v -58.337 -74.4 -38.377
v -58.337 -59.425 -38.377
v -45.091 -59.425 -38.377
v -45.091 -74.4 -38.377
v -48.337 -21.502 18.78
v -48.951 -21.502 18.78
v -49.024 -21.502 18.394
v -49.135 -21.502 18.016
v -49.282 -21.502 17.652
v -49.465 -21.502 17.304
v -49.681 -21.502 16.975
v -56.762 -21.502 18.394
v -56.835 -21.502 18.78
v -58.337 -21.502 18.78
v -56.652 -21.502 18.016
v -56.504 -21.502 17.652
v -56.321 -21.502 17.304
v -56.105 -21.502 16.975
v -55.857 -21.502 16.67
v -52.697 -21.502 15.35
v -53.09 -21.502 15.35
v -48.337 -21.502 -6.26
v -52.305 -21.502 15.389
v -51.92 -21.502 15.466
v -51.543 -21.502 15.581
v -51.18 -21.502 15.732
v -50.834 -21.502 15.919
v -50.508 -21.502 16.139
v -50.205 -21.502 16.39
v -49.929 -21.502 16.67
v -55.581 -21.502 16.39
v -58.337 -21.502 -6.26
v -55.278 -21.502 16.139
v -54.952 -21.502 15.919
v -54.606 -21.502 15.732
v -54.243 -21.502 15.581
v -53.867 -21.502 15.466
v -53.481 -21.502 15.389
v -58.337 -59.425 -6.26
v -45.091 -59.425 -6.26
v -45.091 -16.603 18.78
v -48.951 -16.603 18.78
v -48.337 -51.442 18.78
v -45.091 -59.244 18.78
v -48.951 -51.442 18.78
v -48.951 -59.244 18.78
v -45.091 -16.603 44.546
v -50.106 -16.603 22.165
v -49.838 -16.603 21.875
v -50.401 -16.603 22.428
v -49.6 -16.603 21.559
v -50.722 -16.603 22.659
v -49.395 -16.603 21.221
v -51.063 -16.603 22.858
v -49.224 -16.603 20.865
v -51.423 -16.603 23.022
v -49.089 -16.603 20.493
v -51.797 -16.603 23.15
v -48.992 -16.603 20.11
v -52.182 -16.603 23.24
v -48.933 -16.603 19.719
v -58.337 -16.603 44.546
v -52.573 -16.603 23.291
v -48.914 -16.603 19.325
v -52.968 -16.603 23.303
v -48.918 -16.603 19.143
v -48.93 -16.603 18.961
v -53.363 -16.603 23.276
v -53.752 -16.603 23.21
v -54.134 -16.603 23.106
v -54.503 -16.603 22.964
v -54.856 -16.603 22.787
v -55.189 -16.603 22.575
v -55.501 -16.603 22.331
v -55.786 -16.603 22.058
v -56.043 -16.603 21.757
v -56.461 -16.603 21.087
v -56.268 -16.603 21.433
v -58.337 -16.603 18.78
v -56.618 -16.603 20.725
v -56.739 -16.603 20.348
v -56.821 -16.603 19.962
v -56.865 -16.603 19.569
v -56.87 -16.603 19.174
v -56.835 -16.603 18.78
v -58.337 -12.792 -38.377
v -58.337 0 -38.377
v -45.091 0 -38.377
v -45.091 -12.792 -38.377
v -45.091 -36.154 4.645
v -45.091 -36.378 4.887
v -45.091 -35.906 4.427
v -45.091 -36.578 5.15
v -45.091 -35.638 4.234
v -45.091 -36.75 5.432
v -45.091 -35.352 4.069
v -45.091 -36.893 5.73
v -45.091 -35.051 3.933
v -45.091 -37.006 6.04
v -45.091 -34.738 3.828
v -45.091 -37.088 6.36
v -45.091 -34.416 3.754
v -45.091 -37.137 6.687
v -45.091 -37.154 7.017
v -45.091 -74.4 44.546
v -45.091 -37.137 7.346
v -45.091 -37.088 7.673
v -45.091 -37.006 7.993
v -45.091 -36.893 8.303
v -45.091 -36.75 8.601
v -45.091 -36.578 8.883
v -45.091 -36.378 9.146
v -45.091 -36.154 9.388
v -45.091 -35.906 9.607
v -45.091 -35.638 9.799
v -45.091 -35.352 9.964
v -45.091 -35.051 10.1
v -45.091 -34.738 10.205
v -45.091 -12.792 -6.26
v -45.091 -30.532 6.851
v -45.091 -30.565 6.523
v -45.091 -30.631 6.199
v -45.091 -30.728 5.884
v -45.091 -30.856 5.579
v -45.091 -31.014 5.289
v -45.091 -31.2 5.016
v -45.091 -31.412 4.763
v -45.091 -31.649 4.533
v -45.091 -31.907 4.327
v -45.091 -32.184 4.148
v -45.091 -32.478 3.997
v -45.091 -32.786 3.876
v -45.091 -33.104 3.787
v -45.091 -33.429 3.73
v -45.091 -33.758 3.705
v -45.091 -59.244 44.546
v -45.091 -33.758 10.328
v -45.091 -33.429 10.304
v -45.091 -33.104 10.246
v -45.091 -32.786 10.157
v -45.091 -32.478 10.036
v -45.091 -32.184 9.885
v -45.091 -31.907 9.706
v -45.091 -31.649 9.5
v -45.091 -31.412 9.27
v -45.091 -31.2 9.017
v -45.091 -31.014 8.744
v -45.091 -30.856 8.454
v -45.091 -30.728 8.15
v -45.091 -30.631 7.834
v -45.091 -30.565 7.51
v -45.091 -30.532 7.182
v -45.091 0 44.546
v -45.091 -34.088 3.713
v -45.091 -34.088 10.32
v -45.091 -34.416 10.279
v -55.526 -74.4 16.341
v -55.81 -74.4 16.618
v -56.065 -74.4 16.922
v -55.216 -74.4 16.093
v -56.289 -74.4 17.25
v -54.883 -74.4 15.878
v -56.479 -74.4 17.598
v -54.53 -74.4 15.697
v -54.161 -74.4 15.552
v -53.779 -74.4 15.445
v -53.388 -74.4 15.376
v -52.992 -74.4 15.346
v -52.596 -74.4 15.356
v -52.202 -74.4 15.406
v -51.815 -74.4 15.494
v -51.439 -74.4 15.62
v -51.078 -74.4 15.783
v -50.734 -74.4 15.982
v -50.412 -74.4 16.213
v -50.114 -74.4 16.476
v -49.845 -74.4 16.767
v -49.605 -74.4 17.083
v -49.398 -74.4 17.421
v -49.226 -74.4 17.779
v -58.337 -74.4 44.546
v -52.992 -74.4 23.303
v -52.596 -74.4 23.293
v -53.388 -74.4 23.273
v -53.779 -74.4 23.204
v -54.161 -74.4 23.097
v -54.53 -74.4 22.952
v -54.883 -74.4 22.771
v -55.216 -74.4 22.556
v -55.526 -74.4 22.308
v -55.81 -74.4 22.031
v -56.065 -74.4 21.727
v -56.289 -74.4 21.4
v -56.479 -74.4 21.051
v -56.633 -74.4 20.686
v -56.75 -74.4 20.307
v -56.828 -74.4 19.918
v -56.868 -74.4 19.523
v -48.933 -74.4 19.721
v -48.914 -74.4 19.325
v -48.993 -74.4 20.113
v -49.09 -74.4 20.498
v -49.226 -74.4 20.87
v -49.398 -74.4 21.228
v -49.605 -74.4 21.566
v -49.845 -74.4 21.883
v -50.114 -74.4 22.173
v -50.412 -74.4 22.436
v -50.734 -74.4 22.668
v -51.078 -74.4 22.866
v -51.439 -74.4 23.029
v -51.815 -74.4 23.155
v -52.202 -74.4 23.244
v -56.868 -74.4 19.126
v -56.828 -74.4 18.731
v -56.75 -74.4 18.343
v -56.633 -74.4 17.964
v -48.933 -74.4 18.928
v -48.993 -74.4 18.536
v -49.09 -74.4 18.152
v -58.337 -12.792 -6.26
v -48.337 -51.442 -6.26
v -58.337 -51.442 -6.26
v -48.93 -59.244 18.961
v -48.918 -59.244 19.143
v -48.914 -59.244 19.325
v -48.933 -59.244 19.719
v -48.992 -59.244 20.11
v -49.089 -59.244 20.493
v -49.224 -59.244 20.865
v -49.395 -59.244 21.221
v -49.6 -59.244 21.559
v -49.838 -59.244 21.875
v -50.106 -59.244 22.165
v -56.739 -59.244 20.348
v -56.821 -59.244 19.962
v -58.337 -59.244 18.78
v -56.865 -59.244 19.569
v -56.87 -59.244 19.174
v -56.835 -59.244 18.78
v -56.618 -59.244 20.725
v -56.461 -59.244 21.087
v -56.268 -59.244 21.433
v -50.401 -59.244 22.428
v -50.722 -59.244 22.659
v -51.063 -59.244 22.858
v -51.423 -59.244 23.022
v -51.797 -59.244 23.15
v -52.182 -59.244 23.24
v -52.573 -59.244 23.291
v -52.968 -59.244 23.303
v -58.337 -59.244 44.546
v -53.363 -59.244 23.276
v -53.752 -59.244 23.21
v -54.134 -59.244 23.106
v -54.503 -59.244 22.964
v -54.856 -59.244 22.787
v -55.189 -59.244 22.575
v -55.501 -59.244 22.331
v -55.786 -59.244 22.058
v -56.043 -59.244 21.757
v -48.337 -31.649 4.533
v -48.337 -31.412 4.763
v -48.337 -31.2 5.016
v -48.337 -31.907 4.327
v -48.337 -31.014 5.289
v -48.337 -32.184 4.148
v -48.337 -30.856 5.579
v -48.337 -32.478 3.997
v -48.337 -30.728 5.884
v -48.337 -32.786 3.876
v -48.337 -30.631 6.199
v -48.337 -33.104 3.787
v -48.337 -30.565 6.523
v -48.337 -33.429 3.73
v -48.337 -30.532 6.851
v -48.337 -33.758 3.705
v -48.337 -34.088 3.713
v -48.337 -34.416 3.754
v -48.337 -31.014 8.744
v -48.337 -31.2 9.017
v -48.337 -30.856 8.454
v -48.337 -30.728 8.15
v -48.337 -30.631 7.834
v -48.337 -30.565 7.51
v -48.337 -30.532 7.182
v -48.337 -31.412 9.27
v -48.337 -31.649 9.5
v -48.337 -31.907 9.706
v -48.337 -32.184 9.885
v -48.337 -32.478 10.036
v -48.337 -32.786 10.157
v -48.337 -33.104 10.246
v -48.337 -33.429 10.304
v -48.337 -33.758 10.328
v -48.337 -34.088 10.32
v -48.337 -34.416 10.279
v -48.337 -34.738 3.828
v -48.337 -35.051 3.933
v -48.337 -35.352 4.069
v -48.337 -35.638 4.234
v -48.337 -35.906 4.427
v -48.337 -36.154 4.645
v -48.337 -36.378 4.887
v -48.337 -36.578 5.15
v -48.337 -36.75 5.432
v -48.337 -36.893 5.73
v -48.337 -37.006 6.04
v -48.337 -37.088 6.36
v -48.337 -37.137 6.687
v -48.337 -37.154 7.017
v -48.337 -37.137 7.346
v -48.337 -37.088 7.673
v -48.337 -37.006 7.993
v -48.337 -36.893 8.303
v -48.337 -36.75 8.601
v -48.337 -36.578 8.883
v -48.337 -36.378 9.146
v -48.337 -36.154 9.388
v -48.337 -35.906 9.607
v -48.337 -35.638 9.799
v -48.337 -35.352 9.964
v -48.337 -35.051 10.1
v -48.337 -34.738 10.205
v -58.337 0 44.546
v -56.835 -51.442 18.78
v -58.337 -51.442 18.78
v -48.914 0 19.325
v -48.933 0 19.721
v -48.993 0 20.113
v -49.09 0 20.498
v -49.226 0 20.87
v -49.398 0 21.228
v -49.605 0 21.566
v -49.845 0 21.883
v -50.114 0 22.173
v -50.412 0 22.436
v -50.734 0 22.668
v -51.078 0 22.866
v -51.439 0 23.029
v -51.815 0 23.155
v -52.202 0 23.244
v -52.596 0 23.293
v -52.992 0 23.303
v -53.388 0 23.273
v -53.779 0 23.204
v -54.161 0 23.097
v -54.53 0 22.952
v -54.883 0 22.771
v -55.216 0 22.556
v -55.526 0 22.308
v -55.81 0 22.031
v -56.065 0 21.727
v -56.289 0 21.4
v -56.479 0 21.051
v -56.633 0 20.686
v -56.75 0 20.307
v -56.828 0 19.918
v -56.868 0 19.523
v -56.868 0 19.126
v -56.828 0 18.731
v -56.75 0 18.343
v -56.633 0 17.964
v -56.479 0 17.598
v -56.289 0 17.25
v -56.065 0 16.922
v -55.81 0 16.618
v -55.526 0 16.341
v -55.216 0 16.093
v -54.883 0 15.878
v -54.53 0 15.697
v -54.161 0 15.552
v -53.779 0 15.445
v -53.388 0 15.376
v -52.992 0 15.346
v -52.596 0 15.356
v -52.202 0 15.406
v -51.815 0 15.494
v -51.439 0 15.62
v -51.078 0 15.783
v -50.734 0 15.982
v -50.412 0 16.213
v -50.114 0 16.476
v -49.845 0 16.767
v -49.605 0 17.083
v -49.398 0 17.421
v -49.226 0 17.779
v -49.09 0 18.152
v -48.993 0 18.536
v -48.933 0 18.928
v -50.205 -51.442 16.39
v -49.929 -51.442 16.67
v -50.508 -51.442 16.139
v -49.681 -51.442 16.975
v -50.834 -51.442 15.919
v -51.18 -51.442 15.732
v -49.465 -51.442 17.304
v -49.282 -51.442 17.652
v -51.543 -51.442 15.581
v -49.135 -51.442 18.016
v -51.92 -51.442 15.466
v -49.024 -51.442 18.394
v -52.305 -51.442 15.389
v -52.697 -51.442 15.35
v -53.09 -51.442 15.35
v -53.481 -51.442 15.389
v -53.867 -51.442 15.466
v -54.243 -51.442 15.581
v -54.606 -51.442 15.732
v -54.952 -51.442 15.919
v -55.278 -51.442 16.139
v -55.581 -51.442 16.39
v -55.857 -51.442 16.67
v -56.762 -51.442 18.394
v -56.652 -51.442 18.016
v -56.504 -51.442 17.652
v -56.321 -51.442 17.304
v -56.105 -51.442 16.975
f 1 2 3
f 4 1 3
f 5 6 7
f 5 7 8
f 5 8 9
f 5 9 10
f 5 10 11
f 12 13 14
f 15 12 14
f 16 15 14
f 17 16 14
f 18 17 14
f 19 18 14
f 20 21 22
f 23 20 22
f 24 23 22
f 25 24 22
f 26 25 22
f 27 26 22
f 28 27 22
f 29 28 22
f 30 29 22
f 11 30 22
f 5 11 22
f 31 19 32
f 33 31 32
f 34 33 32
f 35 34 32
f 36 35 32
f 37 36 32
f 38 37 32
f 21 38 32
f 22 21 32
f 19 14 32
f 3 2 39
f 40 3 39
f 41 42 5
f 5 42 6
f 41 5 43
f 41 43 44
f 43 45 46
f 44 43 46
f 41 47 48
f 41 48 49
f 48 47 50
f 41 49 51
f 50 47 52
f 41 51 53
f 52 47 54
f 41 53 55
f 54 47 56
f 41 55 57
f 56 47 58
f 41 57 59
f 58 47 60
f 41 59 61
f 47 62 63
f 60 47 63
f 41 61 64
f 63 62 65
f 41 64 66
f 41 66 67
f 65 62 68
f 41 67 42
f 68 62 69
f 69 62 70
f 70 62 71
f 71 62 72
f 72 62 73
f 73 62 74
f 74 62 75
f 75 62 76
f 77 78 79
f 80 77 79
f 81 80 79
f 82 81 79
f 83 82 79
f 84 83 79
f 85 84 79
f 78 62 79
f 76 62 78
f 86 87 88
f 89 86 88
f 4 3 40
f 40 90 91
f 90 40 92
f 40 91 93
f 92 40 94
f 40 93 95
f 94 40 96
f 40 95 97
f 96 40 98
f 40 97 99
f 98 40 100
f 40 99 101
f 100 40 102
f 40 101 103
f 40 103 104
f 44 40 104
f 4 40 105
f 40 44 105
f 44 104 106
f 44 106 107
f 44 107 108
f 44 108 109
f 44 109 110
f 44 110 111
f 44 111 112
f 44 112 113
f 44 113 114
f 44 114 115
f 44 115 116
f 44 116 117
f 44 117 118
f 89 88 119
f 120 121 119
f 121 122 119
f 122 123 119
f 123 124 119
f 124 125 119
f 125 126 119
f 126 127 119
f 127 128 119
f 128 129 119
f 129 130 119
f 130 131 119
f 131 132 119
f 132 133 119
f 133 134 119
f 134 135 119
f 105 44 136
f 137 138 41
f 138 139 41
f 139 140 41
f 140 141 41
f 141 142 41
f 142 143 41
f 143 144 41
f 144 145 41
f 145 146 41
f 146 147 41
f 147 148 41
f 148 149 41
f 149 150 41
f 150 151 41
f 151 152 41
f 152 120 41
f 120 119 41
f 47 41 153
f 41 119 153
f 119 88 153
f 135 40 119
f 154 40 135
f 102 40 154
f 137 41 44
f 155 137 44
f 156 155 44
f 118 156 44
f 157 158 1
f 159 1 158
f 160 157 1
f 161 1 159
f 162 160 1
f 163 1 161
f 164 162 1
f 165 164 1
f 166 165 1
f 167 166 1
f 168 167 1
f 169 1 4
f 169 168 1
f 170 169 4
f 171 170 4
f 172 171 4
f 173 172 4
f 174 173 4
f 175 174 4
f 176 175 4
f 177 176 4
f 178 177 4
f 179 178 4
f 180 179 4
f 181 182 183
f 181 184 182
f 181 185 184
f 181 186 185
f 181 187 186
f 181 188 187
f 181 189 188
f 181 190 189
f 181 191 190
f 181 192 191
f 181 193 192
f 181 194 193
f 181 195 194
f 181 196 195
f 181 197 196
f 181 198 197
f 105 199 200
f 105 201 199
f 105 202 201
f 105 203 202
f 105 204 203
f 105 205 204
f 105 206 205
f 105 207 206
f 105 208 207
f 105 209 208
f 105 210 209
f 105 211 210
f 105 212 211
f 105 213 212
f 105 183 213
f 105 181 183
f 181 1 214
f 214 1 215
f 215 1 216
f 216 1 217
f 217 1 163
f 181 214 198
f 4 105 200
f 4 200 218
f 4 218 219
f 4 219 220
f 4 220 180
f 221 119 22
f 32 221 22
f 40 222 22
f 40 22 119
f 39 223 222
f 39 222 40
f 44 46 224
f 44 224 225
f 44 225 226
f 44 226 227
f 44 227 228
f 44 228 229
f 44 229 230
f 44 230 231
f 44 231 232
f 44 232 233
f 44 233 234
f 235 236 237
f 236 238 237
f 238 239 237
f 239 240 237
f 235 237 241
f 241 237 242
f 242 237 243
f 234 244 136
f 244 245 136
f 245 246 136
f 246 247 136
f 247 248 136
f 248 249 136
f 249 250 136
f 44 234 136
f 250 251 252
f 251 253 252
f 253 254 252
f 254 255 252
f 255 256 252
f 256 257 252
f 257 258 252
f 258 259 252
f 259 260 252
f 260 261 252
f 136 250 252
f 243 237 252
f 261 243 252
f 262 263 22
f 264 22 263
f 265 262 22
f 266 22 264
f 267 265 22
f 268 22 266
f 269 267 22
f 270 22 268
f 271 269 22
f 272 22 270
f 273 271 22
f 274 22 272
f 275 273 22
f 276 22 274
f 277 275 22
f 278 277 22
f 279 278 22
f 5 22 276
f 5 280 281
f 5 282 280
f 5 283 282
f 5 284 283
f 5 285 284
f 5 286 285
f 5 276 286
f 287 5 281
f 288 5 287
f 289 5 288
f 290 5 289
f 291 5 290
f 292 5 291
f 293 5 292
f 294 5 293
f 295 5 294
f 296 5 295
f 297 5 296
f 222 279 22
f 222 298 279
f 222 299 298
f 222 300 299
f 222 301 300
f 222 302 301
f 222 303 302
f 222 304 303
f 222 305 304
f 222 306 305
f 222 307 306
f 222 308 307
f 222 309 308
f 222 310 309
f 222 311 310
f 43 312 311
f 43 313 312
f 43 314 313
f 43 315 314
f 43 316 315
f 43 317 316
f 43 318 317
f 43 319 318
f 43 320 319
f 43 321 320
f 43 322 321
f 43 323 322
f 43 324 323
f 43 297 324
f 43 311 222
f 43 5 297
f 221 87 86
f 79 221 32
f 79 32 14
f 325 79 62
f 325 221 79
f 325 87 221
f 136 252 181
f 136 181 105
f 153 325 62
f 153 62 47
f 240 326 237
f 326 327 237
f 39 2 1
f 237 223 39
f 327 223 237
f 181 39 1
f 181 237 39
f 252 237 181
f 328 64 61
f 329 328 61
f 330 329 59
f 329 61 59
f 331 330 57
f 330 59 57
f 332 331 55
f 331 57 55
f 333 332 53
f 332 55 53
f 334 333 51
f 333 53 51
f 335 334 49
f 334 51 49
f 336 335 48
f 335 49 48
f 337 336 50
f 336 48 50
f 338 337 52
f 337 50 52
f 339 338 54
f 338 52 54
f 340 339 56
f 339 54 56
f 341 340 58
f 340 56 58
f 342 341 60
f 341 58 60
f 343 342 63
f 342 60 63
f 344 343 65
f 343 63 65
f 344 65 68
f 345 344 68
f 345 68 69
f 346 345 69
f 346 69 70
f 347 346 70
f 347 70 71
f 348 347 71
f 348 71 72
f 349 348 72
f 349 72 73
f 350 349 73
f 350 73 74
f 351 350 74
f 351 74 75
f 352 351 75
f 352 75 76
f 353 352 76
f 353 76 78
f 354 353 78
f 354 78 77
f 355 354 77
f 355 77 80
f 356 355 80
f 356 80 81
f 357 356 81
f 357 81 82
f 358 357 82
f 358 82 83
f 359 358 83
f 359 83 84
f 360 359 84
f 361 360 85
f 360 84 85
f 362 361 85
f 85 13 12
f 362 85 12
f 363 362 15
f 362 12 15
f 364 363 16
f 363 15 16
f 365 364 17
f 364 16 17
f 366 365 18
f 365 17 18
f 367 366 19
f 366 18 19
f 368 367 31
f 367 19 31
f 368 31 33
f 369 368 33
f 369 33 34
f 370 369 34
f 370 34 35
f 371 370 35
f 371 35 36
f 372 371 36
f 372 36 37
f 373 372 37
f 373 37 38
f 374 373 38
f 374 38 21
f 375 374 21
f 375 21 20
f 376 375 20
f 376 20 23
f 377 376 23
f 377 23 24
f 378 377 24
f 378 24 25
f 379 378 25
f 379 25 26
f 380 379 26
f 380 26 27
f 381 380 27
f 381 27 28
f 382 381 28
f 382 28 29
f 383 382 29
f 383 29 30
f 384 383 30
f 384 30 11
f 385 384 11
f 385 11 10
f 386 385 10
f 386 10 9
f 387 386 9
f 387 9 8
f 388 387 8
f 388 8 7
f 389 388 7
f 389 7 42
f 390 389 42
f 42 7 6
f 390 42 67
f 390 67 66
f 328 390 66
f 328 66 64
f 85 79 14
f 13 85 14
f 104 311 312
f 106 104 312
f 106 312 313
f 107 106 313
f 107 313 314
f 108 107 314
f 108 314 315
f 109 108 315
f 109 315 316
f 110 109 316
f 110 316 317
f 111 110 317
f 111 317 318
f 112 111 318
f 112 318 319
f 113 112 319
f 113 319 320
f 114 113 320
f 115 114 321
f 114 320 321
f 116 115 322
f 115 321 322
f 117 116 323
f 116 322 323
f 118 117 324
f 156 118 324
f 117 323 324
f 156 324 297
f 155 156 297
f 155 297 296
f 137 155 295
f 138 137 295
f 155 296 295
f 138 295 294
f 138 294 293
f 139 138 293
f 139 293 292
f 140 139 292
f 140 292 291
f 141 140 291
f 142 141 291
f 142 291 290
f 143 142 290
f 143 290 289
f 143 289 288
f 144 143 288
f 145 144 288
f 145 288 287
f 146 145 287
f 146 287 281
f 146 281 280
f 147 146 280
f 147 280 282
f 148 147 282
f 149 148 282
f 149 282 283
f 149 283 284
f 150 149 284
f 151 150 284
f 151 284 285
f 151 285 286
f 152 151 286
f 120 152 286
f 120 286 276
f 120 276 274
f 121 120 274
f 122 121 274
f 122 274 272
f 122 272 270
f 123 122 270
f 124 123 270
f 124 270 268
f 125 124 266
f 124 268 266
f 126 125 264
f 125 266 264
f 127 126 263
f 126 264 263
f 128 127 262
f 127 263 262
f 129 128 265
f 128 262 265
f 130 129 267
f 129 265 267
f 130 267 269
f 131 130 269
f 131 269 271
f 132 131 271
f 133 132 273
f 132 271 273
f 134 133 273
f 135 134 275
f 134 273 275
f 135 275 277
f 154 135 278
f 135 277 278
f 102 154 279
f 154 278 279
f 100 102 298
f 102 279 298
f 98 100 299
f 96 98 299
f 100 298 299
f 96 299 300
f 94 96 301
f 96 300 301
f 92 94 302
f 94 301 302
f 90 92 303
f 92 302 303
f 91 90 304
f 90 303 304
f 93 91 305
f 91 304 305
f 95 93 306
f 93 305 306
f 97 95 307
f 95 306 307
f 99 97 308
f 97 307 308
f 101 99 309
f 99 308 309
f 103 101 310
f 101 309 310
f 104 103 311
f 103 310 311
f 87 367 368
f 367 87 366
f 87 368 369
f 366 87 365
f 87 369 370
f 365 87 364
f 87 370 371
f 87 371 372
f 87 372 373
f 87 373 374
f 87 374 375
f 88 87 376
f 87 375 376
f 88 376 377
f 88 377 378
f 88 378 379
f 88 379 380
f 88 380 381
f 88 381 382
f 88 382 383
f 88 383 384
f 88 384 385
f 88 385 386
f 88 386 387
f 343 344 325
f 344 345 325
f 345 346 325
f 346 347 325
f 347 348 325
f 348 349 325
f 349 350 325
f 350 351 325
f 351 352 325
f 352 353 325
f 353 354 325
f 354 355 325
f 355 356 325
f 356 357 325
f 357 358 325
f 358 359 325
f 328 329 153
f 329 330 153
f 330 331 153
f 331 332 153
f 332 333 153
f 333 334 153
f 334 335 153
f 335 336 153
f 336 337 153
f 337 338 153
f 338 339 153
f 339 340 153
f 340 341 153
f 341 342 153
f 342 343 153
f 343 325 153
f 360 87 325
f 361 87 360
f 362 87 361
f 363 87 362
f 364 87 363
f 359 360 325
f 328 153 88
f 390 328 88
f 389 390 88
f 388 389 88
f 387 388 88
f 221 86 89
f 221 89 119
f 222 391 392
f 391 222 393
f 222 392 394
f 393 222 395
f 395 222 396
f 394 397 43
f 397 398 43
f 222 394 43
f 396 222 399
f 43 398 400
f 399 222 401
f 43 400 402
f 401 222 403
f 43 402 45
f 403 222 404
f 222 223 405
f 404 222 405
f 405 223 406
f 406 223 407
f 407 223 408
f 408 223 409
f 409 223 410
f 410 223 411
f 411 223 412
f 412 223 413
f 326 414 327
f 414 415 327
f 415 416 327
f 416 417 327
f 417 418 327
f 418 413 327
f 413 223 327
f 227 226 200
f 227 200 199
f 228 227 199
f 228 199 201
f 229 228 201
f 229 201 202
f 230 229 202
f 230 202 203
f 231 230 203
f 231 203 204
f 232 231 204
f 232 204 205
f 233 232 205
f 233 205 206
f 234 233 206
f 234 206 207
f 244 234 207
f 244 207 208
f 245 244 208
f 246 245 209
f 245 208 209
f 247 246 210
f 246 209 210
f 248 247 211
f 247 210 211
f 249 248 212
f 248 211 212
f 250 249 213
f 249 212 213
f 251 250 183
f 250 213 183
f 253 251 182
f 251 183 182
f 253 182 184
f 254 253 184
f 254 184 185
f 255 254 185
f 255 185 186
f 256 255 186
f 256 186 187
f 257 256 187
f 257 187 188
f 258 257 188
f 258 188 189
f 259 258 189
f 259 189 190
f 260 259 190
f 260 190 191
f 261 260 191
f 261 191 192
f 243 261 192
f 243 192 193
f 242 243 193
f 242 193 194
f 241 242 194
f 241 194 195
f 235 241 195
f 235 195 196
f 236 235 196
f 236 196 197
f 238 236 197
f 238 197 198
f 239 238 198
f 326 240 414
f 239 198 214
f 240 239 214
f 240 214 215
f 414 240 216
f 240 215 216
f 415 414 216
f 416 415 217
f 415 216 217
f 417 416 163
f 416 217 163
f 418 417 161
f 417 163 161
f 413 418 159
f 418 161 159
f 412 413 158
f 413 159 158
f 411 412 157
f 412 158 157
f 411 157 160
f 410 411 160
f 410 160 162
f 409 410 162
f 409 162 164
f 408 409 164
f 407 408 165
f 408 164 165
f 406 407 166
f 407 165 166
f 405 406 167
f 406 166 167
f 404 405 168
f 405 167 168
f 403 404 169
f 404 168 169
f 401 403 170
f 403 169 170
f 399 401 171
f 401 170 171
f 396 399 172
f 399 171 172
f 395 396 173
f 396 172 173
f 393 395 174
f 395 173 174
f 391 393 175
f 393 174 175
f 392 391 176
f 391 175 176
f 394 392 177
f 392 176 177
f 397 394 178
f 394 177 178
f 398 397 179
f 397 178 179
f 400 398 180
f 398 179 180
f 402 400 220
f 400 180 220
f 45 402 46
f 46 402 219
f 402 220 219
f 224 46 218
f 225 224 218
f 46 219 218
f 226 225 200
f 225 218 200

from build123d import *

# Parameters (mm, degrees)
F0_W     = 13.2459662855
F0_H     = 82.9233899713
F1_DEPTH = 74.4
F2_W     = 42.6411293447
F2_H     = 25.7661305368
F2_W_2   = 46.6330666095
F2_H_2   = 32.1169355884
F2_H_3   = 1.9959695637
F3_DEPTH = 25
F4_W     = 29.9395192415
F4_H     = 32.2983870283
F4_H_2   = 4.173386842
F4_H_3   = 25.040323846
F5_DEPTH = 10
F6_R     = 3.9795460227
F7_DEPTH = 90.9
F8_R     = 3.3126964472
F9_DEPTH = 59.4


with BuildPart() as f1:
    # F0 (on Front) → F1 (new body)
    with BuildSketch(Plane.XZ):
        with Locations((-51.7137106508, 3.0846782029)):
            Rectangle(F0_W, F0_H)
    extrude(amount=F1_DEPTH)

    # F2 (on face) → F3 (cut)
    with BuildSketch(Plane(origin=(-58.3366937935, 0, 0), x_dir=(0, -1, 0), z_dir=(-1, 0, 0))):
        with Locations((37.9233863205, 31.6633079201)):
            Rectangle(F2_W, F2_H)
        with Locations((36.1088728532, -22.3185489886)):
            Rectangle(F2_W_2, F2_H_2)
        with Locations((37.9233863205, 45.5443579704)):
            Rectangle(F2_W, F2_H_3)
    extrude(amount=-F3_DEPTH, mode=Mode.SUBTRACT)

    # F4 (on face) → F5 (cut)
    with BuildSketch(Plane(origin=(-58.3366937935, 0, 0), x_dir=(0, -1, 0), z_dir=(-1, 0, 0))):
        with Locations((36.4717757329, -22.4092747085)):
            Rectangle(F4_W, F4_H)
        with Locations((36.4717757329, 20.8669360727)):
            Rectangle(F4_W, F4_H_2)
        with Locations((36.4717757329, 6.2600807287)):
            Rectangle(F4_W, F4_H_3)
    extrude(amount=-F5_DEPTH, mode=Mode.SUBTRACT)

    # F6 (on face) → F7 (cut)
    with BuildSketch(Plane.XZ.offset(74.4)):
        with Locations((-52.8931468725, 19.3245988339)):
            Circle(F6_R)
    extrude(amount=-F7_DEPTH, mode=Mode.SUBTRACT)

    # F8 (on face) → F9 (cut)
    with BuildSketch(Plane(origin=(-48.3366937935, 0, 0), x_dir=(0, -1, 0), z_dir=(-1, 0, 0))):
        with Locations((33.8408090174, 7.0165661164)):
            Circle(F8_R)
    extrude(amount=-F9_DEPTH, mode=Mode.SUBTRACT)


solid = f1.part
